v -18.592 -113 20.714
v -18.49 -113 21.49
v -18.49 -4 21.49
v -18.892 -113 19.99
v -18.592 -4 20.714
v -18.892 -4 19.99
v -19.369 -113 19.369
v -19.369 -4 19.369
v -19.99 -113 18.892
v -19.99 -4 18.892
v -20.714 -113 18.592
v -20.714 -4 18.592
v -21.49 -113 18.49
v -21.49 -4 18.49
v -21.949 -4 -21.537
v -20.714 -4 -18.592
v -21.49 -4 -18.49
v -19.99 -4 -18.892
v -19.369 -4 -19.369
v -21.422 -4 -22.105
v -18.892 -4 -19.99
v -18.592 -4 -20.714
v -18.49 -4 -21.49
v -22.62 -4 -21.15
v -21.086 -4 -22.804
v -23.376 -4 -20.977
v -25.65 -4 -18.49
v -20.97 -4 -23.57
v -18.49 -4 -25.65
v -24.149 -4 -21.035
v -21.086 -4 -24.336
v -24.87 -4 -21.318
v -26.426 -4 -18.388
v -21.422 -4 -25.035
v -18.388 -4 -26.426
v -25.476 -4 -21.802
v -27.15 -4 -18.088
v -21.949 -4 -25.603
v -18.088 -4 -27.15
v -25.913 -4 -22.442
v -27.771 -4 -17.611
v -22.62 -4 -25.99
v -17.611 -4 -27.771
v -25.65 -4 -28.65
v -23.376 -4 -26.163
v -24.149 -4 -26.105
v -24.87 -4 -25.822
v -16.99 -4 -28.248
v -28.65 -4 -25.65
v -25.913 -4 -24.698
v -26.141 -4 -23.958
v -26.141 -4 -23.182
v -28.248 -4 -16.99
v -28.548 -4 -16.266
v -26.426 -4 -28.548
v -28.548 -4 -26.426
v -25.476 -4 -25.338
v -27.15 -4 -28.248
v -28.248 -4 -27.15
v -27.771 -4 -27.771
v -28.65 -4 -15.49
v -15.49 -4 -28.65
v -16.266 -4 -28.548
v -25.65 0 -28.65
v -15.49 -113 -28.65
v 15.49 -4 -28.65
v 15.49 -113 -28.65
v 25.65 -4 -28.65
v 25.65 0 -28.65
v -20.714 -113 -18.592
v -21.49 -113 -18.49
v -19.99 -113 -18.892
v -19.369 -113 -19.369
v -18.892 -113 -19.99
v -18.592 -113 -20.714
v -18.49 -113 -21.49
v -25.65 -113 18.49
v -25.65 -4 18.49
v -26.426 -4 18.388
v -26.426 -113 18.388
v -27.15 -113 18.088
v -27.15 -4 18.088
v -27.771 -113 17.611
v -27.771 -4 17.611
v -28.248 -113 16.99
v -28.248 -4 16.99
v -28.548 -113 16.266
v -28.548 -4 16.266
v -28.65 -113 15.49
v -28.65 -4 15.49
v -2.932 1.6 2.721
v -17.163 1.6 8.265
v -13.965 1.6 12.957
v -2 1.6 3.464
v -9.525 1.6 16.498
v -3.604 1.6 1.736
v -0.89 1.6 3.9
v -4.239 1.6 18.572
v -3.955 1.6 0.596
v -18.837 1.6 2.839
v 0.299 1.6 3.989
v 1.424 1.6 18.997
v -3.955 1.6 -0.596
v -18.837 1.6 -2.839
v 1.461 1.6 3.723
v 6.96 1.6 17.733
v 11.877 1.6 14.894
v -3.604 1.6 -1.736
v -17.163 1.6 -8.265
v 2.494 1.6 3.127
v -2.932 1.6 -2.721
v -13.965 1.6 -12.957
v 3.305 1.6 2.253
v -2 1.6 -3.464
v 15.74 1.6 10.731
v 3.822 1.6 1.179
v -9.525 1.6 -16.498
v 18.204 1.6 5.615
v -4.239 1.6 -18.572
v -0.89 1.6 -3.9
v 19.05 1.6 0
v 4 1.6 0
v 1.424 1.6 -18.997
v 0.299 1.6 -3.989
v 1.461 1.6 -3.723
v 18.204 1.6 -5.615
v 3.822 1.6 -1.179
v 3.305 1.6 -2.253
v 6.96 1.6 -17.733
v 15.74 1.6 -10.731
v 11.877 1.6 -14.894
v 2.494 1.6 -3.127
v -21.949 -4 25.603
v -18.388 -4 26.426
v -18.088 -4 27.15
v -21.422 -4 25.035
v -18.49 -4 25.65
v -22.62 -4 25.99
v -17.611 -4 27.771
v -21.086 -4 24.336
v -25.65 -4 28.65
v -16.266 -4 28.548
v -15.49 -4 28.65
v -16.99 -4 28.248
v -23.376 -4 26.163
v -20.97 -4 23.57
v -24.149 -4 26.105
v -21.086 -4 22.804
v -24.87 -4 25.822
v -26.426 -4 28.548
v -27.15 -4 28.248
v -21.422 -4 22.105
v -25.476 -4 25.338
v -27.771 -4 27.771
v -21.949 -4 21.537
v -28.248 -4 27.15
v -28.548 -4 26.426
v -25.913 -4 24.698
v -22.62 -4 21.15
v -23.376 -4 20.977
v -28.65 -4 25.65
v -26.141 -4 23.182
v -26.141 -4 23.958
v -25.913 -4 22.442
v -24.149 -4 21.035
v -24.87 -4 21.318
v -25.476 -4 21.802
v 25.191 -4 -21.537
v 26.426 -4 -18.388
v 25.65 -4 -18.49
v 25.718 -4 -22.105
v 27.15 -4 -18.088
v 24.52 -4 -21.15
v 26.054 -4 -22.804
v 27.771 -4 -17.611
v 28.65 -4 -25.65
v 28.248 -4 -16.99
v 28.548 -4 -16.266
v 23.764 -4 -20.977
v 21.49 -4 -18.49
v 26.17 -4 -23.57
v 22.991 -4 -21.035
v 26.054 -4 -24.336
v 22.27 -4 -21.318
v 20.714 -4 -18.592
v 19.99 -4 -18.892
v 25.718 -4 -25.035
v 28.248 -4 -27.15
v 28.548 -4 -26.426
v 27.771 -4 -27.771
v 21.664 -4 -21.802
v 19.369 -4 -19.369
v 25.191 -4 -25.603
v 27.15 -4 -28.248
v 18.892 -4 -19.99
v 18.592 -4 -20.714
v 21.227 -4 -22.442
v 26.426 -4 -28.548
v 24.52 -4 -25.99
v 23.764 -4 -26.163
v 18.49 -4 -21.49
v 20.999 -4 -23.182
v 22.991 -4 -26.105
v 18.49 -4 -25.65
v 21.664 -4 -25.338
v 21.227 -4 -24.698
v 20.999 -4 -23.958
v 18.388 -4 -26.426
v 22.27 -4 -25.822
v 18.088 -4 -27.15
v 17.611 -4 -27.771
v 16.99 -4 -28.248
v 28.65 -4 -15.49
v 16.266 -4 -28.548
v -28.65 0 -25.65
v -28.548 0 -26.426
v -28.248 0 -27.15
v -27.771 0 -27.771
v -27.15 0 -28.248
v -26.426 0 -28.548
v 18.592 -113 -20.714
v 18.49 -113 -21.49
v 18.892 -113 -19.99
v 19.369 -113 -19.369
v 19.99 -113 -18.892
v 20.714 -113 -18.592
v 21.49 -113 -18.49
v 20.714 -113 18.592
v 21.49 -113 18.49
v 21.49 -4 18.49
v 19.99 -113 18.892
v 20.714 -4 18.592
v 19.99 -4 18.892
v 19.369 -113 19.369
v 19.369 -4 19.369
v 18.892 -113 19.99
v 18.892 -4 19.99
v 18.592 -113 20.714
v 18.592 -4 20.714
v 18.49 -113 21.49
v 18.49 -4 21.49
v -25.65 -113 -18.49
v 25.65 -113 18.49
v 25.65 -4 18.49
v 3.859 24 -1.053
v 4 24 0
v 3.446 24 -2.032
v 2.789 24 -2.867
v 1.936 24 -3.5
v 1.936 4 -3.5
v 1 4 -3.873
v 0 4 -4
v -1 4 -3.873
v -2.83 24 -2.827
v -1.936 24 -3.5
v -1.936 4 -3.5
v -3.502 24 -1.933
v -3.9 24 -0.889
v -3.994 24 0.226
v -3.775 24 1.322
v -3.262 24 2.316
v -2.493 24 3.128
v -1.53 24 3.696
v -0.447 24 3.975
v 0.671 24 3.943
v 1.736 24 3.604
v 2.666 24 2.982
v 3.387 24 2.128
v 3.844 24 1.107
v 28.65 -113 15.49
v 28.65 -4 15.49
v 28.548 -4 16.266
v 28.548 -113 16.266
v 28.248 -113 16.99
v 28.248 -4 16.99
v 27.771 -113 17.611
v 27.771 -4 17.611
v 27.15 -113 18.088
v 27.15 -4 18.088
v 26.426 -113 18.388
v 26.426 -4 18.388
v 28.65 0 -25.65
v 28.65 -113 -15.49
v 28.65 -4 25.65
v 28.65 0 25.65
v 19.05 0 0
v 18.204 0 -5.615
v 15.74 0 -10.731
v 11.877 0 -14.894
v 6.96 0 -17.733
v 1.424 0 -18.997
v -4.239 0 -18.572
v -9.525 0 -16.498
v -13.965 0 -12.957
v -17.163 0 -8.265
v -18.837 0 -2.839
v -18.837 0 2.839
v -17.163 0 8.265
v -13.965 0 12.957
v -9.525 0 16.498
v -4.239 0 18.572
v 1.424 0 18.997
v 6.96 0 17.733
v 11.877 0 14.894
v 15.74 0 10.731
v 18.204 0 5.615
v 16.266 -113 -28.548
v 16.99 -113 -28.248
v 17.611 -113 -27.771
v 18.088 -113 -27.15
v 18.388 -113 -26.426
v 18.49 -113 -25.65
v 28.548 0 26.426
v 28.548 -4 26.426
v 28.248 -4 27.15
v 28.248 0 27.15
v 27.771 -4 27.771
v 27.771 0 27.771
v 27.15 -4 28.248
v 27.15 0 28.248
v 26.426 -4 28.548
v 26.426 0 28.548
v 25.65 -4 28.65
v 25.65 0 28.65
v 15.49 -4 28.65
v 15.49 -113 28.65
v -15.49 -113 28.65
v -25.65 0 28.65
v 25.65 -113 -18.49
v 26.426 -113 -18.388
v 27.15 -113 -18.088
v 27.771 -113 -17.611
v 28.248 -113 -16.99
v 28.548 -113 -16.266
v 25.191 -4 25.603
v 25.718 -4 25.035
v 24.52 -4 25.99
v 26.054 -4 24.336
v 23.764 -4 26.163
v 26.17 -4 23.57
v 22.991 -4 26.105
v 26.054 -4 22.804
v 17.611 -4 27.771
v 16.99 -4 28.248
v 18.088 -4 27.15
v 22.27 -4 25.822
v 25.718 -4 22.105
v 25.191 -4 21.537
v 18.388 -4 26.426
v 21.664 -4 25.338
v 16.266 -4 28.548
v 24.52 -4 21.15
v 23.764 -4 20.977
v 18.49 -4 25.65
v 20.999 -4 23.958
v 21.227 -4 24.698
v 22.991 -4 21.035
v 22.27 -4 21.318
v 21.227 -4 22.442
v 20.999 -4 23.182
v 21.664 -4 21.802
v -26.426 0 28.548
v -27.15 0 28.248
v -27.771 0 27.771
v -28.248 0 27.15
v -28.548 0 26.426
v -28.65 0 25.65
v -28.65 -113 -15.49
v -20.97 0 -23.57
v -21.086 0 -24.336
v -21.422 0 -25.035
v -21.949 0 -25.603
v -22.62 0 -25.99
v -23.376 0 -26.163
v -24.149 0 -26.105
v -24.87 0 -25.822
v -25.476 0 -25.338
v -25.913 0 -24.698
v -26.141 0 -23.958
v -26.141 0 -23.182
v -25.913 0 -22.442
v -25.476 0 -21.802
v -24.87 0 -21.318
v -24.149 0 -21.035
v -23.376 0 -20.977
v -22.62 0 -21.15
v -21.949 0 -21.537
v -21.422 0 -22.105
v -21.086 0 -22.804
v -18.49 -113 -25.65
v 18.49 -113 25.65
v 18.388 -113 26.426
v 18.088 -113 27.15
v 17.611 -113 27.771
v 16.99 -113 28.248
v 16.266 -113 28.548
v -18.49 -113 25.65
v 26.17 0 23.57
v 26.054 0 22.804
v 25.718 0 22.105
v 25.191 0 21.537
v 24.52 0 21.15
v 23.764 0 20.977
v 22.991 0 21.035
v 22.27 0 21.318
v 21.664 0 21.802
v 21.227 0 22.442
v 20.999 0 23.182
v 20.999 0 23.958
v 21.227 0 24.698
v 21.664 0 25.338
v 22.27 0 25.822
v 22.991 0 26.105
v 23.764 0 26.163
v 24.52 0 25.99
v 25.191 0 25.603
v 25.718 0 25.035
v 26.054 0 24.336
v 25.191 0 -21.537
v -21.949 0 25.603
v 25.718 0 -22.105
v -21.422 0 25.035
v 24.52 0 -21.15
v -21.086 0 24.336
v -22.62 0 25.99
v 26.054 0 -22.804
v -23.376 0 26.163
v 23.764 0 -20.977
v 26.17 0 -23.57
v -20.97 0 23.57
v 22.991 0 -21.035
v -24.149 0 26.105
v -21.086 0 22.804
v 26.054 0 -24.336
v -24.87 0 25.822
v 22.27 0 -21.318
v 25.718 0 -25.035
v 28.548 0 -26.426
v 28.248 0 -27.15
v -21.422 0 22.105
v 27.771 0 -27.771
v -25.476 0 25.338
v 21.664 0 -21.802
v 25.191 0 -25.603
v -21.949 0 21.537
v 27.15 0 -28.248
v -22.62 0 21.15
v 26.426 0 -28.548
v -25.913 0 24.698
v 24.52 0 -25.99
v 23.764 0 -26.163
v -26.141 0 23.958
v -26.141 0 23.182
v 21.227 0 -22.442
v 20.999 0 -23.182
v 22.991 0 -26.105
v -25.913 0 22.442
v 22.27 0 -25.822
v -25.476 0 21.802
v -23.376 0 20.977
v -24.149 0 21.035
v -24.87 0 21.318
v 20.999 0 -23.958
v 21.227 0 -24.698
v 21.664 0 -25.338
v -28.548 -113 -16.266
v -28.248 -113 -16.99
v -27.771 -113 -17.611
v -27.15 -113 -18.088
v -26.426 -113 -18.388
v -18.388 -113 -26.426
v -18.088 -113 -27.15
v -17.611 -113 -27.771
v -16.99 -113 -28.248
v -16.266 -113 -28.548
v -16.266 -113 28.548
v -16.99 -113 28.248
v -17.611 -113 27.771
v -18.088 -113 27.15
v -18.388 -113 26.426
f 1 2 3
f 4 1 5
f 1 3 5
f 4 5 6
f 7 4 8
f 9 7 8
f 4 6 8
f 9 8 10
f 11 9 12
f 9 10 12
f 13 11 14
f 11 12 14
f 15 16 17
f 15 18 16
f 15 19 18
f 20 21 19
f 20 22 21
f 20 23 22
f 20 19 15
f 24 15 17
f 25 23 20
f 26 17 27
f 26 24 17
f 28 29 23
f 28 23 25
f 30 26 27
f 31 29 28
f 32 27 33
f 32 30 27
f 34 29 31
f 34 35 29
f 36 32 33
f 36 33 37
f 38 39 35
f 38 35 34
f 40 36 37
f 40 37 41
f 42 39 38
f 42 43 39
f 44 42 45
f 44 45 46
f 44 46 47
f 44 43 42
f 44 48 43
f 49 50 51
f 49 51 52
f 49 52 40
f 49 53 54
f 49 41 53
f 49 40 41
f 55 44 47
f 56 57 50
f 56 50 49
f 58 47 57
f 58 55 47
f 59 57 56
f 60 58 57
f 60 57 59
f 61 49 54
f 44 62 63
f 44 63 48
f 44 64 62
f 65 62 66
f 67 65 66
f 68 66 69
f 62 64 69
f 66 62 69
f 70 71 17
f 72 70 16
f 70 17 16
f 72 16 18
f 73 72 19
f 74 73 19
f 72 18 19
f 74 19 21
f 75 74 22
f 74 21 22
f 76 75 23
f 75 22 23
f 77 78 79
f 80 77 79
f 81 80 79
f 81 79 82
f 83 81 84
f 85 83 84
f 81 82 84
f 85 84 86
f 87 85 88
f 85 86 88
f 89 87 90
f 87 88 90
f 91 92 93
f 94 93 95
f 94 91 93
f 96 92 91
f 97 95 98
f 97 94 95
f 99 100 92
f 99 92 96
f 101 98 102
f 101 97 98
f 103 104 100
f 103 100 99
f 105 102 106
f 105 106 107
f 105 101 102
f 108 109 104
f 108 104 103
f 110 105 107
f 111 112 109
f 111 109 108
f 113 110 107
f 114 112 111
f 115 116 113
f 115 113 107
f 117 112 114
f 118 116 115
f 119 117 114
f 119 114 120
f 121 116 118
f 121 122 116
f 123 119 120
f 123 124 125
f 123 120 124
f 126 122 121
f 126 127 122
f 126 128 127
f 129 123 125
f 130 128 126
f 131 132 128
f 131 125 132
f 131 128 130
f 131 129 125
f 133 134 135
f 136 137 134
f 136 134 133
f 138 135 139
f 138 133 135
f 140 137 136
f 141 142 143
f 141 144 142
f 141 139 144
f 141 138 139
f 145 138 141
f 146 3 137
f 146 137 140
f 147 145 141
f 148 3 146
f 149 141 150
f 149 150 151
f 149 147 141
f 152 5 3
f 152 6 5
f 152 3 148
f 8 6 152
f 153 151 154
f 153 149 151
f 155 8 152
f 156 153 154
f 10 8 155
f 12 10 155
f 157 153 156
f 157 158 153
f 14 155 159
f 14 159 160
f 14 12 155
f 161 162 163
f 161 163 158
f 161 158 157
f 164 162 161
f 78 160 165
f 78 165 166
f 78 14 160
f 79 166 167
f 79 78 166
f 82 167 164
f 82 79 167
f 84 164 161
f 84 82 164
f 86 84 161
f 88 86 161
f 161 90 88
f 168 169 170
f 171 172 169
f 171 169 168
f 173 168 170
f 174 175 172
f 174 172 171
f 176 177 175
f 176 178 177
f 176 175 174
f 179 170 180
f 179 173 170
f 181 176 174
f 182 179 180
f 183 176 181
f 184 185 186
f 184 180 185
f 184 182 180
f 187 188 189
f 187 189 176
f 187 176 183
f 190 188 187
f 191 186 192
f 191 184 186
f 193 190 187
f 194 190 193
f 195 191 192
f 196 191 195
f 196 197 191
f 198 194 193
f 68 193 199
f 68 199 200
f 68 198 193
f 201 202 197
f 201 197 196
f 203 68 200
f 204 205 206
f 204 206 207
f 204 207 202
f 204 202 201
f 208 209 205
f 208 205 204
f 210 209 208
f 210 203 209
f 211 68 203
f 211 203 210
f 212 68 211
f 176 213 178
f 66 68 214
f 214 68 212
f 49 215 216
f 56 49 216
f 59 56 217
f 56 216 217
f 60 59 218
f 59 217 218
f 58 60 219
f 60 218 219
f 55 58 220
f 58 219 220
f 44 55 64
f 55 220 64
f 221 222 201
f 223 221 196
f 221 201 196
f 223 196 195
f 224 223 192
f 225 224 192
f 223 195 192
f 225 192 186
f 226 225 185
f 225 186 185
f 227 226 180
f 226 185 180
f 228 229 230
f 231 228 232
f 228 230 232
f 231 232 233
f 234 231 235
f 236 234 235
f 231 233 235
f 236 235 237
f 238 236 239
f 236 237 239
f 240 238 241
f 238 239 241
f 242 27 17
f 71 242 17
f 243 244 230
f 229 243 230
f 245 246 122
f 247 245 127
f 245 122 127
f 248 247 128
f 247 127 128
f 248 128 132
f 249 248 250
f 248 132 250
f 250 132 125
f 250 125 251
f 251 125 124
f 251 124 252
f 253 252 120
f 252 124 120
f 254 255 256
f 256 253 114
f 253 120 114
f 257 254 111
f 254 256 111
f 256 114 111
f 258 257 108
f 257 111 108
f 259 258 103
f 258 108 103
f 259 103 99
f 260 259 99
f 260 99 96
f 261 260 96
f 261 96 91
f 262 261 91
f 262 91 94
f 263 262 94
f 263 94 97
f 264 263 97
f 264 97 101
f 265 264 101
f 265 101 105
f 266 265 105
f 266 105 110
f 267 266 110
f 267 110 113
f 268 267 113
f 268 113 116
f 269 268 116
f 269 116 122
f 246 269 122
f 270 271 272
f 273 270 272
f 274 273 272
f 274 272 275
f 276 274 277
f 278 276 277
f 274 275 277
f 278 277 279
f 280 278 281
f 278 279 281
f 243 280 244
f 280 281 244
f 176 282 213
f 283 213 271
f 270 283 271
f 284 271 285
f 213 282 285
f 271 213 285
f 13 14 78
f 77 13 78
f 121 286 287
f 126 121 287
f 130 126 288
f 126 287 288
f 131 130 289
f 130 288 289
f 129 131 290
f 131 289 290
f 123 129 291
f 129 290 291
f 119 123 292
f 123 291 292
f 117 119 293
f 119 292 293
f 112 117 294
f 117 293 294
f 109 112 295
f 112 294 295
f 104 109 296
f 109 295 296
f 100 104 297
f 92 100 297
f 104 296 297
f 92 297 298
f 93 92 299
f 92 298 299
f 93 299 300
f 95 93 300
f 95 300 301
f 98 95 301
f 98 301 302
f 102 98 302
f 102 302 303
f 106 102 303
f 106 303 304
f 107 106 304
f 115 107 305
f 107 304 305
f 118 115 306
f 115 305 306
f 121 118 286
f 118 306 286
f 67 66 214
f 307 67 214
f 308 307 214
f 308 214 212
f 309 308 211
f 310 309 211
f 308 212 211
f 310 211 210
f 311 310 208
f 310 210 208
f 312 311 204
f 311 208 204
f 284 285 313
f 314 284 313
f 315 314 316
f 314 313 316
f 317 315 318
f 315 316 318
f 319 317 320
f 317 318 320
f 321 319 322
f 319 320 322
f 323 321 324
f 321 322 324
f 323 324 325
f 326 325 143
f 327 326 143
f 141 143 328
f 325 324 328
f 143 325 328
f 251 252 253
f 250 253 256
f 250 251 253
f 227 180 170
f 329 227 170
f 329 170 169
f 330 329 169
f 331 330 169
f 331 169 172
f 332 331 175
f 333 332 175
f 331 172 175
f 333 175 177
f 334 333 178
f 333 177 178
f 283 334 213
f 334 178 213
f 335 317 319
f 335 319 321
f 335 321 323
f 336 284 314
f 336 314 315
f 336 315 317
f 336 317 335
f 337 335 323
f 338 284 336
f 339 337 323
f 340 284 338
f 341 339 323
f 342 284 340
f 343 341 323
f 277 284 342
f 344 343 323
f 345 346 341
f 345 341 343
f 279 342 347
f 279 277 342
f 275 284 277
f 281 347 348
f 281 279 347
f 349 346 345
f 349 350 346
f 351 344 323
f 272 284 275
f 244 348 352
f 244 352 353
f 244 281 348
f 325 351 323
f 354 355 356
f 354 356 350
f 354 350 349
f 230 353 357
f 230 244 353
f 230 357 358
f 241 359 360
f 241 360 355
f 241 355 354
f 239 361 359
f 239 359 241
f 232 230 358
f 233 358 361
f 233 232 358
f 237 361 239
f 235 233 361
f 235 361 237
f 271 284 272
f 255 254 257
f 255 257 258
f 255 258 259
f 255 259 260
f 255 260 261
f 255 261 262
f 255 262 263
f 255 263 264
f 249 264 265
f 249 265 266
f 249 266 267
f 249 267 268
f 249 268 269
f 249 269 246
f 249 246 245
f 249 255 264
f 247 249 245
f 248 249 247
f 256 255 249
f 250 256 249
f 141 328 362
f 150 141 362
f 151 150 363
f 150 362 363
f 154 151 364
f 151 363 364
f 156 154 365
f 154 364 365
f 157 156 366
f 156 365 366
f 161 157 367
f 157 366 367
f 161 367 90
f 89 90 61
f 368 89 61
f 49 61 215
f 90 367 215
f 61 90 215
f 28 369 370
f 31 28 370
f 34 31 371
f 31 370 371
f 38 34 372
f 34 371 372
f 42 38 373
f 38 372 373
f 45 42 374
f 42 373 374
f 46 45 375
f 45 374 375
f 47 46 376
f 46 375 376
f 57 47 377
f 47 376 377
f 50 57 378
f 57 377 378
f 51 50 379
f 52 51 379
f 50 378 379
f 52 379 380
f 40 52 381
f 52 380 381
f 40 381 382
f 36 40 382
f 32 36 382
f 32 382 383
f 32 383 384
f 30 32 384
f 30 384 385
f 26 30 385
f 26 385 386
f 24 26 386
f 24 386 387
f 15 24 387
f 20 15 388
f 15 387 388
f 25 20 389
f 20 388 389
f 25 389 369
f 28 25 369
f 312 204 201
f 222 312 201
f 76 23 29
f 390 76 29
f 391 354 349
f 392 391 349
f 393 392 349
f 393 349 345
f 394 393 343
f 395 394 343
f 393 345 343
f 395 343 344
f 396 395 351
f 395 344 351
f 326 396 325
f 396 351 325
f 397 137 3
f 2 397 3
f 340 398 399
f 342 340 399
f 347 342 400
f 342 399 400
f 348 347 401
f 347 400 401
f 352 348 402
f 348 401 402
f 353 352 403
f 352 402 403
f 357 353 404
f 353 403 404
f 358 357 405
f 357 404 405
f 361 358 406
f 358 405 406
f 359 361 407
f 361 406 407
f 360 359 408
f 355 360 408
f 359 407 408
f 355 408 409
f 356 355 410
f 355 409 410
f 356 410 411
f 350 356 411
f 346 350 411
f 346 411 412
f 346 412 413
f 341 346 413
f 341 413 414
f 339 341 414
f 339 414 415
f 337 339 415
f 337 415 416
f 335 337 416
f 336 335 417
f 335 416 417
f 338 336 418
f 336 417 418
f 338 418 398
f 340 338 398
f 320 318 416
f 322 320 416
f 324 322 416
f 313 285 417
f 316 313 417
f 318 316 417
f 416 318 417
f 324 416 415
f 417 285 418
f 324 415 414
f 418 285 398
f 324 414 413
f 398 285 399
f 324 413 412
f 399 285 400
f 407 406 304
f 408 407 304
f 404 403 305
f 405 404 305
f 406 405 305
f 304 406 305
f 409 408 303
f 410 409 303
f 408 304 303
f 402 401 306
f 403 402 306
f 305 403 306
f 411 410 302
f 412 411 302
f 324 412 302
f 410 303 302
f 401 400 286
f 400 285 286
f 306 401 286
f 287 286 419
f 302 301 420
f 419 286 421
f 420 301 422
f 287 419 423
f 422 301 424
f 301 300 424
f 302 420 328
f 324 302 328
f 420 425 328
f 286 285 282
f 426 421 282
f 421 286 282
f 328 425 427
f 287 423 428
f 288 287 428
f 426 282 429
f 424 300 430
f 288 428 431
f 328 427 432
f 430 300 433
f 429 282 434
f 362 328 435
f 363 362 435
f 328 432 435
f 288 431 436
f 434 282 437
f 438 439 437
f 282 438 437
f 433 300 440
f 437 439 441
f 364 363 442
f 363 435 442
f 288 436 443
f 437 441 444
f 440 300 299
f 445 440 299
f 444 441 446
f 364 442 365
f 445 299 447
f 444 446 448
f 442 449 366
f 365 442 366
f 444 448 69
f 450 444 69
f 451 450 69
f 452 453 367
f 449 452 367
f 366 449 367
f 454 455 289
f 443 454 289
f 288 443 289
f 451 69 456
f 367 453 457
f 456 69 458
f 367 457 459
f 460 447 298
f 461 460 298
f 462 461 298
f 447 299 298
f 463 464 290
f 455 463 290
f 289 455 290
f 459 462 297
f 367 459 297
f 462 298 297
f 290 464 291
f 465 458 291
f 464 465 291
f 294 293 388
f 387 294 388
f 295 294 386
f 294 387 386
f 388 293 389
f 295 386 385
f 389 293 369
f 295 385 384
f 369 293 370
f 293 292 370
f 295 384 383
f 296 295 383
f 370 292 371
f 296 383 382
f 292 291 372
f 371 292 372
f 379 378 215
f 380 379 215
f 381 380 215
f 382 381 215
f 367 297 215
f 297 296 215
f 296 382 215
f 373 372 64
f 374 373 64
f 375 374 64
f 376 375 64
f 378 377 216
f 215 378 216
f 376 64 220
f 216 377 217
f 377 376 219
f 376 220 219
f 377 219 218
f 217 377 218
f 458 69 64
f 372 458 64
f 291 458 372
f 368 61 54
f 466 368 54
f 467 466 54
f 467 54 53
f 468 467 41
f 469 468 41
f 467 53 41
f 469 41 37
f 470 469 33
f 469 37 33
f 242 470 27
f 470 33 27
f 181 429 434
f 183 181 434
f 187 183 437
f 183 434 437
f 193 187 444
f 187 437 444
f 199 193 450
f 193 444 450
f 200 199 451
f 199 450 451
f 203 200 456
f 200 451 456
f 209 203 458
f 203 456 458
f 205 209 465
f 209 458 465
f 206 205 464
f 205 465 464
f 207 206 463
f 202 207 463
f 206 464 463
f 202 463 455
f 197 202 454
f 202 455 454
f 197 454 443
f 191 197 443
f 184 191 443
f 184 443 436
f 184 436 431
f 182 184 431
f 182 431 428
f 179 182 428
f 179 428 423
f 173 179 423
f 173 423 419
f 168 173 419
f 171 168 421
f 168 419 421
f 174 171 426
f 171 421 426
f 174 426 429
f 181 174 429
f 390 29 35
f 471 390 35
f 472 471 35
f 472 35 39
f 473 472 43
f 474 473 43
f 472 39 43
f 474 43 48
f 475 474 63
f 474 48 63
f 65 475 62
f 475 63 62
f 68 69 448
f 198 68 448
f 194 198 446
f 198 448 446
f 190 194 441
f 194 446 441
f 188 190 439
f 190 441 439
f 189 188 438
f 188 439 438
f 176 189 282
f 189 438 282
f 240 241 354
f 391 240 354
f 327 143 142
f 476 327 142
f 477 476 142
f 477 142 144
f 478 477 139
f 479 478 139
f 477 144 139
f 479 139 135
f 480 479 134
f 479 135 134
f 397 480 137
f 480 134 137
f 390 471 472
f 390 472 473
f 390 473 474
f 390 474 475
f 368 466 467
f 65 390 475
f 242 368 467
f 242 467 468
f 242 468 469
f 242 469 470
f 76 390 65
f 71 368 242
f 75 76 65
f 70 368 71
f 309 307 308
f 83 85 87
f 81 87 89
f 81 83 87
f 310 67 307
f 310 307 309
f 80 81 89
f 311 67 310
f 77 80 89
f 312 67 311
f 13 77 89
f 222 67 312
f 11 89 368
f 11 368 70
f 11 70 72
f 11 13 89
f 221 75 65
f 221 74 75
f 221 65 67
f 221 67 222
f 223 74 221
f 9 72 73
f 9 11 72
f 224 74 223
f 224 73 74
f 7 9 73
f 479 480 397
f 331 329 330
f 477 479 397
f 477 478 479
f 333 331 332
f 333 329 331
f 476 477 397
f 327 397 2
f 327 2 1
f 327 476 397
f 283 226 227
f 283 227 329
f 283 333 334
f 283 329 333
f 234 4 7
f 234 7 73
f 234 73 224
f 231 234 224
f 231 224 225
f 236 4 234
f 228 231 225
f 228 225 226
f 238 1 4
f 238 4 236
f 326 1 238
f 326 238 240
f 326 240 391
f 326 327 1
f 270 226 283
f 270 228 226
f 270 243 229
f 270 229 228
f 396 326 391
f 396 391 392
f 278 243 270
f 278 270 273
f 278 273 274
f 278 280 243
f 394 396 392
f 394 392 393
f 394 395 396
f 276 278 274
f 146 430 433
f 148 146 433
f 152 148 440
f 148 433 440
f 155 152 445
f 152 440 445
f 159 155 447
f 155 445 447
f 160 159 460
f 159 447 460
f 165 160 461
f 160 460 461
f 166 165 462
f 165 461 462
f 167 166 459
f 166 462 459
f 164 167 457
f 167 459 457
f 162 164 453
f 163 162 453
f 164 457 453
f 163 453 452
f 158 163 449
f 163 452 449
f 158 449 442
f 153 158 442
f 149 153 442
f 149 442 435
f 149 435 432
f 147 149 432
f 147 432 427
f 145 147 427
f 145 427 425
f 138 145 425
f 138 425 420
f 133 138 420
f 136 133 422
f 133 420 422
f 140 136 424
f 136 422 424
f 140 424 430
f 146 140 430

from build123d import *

# Parameters (mm, degrees)
SKETCH1_R           = 2.6
BOSS_EXTRUDE1_DEPTH = 4
SKETCH2_R           = 19.05
BOSS_EXTRUDE2_DEPTH = 1.6
SKETCH3_R           = 4
BOSS_EXTRUDE3_DEPTH = 22.4
CUT_EXTRUDE1_DEPTH  = 20
BOSS_EXTRUDE4_DEPTH = 109


with BuildPart() as part:
    # Sketch1 → Boss-Extrude1 (new body)
    with BuildSketch(Plane(origin=(0, 0, 0), x_dir=(1, 0, 0), z_dir=(0, 1, 0))):
        with BuildLine():
            Line((25.65, -28.65), (-25.65, -28.65))
            ThreePointArc((-25.65, -28.65), (-27.771320344, -27.771320344), (-28.65, -25.65))
            Line((-28.65, -25.65), (-28.65, 25.65))
            ThreePointArc((-28.65, 25.65), (-27.771320344, 27.771320344), (-25.65, 28.65))
            Line((-25.65, 28.65), (25.65, 28.65))
            ThreePointArc((25.65, 28.65), (27.771320344, 27.771320344), (28.65, 25.65))
            Line((28.65, 25.65), (28.65, -25.65))
            ThreePointArc((28.65, -25.65), (27.771320344, -27.771320344), (25.65, -28.65))
        make_face()
        with Locations((-23.57, 23.57)):
            Circle(SKETCH1_R, mode=Mode.SUBTRACT)
        with Locations((23.57, 23.57)):
            Circle(SKETCH1_R, mode=Mode.SUBTRACT)
        with Locations((23.57, -23.57)):
            Circle(SKETCH1_R, mode=Mode.SUBTRACT)
        with Locations((-23.57, -23.57)):
            Circle(SKETCH1_R, mode=Mode.SUBTRACT)
    extrude(amount=-BOSS_EXTRUDE1_DEPTH)

    # Sketch2 → Boss-Extrude2 (add)
    with BuildSketch(Plane(origin=(0, 0, 0), x_dir=(1, 0, 0), z_dir=(0, 1, 0))):
        Circle(SKETCH2_R)
    extrude(amount=BOSS_EXTRUDE2_DEPTH)

    # Sketch3 → Boss-Extrude3 (add)
    with BuildSketch(Plane(origin=(0, 1.6, 0), x_dir=(1, 0, 0), z_dir=(0, 1, 0))):
        Circle(SKETCH3_R)
    extrude(amount=BOSS_EXTRUDE3_DEPTH)

    # Sketch4 → Cut-Extrude1 (cut)
    with BuildSketch(Plane(origin=(0, 24, 0), x_dir=(1, 0, 0), z_dir=(0, 1, 0))):
        with BuildLine():
            Line((-1.936491673, 3.5), (1.936491673, 3.5))
            ThreePointArc((1.936491673, 3.5), (0, 4), (-1.936491673, 3.5))
        make_face()
    extrude(amount=-CUT_EXTRUDE1_DEPTH, mode=Mode.SUBTRACT)

    # Sketch5 → Boss-Extrude4 (add)
    with BuildSketch(Plane.XZ.offset(4)):
        with BuildLine():
            Line((-18.49, 25.65), (-18.49, 21.49))
            ThreePointArc((-18.49, 21.49), (-19.368679656, 19.368679656), (-21.49, 18.49))
            Line((-21.49, 18.49), (-25.65, 18.49))
            ThreePointArc((-25.65, 18.49), (-27.771320344, 17.611320344), (-28.65, 15.49))
            Line((-28.65, 15.49), (-28.65, -15.49))
            ThreePointArc((-28.65, -15.49), (-27.771320344, -17.611320344), (-25.65, -18.49))
            Line((-25.65, -18.49), (-21.49, -18.49))
            ThreePointArc((-21.49, -18.49), (-19.368679656, -19.368679656), (-18.49, -21.49))
            Line((-18.49, -21.49), (-18.49, -25.65))
            ThreePointArc((-18.49, -25.65), (-17.611320344, -27.771320344), (-15.49, -28.65))
            Line((-15.49, -28.65), (15.49, -28.65))
            ThreePointArc((15.49, -28.65), (17.611320344, -27.771320344), (18.49, -25.65))
            Line((18.49, -25.65), (18.49, -21.49))
            ThreePointArc((18.49, -21.49), (19.368679656, -19.368679656), (21.49, -18.49))
            Line((21.49, -18.49), (25.65, -18.49))
            ThreePointArc((25.65, -18.49), (27.771320344, -17.611320344), (28.65, -15.49))
            Line((28.65, -15.49), (28.65, 15.49))
            ThreePointArc((28.65, 15.49), (27.771320344, 17.611320344), (25.65, 18.49))
            Line((25.65, 18.49), (21.49, 18.49))
            ThreePointArc((21.49, 18.49), (19.368679656, 19.368679656), (18.49, 21.49))
            Line((18.49, 21.49), (18.49, 25.65))
            ThreePointArc((18.49, 25.65), (17.611320344, 27.771320344), (15.49, 28.65))
            Line((15.49, 28.65), (-15.49, 28.65))
            ThreePointArc((-15.49, 28.65), (-17.611320344, 27.771320344), (-18.49, 25.65))
        make_face()
    extrude(amount=BOSS_EXTRUDE4_DEPTH)


solid = part.part
